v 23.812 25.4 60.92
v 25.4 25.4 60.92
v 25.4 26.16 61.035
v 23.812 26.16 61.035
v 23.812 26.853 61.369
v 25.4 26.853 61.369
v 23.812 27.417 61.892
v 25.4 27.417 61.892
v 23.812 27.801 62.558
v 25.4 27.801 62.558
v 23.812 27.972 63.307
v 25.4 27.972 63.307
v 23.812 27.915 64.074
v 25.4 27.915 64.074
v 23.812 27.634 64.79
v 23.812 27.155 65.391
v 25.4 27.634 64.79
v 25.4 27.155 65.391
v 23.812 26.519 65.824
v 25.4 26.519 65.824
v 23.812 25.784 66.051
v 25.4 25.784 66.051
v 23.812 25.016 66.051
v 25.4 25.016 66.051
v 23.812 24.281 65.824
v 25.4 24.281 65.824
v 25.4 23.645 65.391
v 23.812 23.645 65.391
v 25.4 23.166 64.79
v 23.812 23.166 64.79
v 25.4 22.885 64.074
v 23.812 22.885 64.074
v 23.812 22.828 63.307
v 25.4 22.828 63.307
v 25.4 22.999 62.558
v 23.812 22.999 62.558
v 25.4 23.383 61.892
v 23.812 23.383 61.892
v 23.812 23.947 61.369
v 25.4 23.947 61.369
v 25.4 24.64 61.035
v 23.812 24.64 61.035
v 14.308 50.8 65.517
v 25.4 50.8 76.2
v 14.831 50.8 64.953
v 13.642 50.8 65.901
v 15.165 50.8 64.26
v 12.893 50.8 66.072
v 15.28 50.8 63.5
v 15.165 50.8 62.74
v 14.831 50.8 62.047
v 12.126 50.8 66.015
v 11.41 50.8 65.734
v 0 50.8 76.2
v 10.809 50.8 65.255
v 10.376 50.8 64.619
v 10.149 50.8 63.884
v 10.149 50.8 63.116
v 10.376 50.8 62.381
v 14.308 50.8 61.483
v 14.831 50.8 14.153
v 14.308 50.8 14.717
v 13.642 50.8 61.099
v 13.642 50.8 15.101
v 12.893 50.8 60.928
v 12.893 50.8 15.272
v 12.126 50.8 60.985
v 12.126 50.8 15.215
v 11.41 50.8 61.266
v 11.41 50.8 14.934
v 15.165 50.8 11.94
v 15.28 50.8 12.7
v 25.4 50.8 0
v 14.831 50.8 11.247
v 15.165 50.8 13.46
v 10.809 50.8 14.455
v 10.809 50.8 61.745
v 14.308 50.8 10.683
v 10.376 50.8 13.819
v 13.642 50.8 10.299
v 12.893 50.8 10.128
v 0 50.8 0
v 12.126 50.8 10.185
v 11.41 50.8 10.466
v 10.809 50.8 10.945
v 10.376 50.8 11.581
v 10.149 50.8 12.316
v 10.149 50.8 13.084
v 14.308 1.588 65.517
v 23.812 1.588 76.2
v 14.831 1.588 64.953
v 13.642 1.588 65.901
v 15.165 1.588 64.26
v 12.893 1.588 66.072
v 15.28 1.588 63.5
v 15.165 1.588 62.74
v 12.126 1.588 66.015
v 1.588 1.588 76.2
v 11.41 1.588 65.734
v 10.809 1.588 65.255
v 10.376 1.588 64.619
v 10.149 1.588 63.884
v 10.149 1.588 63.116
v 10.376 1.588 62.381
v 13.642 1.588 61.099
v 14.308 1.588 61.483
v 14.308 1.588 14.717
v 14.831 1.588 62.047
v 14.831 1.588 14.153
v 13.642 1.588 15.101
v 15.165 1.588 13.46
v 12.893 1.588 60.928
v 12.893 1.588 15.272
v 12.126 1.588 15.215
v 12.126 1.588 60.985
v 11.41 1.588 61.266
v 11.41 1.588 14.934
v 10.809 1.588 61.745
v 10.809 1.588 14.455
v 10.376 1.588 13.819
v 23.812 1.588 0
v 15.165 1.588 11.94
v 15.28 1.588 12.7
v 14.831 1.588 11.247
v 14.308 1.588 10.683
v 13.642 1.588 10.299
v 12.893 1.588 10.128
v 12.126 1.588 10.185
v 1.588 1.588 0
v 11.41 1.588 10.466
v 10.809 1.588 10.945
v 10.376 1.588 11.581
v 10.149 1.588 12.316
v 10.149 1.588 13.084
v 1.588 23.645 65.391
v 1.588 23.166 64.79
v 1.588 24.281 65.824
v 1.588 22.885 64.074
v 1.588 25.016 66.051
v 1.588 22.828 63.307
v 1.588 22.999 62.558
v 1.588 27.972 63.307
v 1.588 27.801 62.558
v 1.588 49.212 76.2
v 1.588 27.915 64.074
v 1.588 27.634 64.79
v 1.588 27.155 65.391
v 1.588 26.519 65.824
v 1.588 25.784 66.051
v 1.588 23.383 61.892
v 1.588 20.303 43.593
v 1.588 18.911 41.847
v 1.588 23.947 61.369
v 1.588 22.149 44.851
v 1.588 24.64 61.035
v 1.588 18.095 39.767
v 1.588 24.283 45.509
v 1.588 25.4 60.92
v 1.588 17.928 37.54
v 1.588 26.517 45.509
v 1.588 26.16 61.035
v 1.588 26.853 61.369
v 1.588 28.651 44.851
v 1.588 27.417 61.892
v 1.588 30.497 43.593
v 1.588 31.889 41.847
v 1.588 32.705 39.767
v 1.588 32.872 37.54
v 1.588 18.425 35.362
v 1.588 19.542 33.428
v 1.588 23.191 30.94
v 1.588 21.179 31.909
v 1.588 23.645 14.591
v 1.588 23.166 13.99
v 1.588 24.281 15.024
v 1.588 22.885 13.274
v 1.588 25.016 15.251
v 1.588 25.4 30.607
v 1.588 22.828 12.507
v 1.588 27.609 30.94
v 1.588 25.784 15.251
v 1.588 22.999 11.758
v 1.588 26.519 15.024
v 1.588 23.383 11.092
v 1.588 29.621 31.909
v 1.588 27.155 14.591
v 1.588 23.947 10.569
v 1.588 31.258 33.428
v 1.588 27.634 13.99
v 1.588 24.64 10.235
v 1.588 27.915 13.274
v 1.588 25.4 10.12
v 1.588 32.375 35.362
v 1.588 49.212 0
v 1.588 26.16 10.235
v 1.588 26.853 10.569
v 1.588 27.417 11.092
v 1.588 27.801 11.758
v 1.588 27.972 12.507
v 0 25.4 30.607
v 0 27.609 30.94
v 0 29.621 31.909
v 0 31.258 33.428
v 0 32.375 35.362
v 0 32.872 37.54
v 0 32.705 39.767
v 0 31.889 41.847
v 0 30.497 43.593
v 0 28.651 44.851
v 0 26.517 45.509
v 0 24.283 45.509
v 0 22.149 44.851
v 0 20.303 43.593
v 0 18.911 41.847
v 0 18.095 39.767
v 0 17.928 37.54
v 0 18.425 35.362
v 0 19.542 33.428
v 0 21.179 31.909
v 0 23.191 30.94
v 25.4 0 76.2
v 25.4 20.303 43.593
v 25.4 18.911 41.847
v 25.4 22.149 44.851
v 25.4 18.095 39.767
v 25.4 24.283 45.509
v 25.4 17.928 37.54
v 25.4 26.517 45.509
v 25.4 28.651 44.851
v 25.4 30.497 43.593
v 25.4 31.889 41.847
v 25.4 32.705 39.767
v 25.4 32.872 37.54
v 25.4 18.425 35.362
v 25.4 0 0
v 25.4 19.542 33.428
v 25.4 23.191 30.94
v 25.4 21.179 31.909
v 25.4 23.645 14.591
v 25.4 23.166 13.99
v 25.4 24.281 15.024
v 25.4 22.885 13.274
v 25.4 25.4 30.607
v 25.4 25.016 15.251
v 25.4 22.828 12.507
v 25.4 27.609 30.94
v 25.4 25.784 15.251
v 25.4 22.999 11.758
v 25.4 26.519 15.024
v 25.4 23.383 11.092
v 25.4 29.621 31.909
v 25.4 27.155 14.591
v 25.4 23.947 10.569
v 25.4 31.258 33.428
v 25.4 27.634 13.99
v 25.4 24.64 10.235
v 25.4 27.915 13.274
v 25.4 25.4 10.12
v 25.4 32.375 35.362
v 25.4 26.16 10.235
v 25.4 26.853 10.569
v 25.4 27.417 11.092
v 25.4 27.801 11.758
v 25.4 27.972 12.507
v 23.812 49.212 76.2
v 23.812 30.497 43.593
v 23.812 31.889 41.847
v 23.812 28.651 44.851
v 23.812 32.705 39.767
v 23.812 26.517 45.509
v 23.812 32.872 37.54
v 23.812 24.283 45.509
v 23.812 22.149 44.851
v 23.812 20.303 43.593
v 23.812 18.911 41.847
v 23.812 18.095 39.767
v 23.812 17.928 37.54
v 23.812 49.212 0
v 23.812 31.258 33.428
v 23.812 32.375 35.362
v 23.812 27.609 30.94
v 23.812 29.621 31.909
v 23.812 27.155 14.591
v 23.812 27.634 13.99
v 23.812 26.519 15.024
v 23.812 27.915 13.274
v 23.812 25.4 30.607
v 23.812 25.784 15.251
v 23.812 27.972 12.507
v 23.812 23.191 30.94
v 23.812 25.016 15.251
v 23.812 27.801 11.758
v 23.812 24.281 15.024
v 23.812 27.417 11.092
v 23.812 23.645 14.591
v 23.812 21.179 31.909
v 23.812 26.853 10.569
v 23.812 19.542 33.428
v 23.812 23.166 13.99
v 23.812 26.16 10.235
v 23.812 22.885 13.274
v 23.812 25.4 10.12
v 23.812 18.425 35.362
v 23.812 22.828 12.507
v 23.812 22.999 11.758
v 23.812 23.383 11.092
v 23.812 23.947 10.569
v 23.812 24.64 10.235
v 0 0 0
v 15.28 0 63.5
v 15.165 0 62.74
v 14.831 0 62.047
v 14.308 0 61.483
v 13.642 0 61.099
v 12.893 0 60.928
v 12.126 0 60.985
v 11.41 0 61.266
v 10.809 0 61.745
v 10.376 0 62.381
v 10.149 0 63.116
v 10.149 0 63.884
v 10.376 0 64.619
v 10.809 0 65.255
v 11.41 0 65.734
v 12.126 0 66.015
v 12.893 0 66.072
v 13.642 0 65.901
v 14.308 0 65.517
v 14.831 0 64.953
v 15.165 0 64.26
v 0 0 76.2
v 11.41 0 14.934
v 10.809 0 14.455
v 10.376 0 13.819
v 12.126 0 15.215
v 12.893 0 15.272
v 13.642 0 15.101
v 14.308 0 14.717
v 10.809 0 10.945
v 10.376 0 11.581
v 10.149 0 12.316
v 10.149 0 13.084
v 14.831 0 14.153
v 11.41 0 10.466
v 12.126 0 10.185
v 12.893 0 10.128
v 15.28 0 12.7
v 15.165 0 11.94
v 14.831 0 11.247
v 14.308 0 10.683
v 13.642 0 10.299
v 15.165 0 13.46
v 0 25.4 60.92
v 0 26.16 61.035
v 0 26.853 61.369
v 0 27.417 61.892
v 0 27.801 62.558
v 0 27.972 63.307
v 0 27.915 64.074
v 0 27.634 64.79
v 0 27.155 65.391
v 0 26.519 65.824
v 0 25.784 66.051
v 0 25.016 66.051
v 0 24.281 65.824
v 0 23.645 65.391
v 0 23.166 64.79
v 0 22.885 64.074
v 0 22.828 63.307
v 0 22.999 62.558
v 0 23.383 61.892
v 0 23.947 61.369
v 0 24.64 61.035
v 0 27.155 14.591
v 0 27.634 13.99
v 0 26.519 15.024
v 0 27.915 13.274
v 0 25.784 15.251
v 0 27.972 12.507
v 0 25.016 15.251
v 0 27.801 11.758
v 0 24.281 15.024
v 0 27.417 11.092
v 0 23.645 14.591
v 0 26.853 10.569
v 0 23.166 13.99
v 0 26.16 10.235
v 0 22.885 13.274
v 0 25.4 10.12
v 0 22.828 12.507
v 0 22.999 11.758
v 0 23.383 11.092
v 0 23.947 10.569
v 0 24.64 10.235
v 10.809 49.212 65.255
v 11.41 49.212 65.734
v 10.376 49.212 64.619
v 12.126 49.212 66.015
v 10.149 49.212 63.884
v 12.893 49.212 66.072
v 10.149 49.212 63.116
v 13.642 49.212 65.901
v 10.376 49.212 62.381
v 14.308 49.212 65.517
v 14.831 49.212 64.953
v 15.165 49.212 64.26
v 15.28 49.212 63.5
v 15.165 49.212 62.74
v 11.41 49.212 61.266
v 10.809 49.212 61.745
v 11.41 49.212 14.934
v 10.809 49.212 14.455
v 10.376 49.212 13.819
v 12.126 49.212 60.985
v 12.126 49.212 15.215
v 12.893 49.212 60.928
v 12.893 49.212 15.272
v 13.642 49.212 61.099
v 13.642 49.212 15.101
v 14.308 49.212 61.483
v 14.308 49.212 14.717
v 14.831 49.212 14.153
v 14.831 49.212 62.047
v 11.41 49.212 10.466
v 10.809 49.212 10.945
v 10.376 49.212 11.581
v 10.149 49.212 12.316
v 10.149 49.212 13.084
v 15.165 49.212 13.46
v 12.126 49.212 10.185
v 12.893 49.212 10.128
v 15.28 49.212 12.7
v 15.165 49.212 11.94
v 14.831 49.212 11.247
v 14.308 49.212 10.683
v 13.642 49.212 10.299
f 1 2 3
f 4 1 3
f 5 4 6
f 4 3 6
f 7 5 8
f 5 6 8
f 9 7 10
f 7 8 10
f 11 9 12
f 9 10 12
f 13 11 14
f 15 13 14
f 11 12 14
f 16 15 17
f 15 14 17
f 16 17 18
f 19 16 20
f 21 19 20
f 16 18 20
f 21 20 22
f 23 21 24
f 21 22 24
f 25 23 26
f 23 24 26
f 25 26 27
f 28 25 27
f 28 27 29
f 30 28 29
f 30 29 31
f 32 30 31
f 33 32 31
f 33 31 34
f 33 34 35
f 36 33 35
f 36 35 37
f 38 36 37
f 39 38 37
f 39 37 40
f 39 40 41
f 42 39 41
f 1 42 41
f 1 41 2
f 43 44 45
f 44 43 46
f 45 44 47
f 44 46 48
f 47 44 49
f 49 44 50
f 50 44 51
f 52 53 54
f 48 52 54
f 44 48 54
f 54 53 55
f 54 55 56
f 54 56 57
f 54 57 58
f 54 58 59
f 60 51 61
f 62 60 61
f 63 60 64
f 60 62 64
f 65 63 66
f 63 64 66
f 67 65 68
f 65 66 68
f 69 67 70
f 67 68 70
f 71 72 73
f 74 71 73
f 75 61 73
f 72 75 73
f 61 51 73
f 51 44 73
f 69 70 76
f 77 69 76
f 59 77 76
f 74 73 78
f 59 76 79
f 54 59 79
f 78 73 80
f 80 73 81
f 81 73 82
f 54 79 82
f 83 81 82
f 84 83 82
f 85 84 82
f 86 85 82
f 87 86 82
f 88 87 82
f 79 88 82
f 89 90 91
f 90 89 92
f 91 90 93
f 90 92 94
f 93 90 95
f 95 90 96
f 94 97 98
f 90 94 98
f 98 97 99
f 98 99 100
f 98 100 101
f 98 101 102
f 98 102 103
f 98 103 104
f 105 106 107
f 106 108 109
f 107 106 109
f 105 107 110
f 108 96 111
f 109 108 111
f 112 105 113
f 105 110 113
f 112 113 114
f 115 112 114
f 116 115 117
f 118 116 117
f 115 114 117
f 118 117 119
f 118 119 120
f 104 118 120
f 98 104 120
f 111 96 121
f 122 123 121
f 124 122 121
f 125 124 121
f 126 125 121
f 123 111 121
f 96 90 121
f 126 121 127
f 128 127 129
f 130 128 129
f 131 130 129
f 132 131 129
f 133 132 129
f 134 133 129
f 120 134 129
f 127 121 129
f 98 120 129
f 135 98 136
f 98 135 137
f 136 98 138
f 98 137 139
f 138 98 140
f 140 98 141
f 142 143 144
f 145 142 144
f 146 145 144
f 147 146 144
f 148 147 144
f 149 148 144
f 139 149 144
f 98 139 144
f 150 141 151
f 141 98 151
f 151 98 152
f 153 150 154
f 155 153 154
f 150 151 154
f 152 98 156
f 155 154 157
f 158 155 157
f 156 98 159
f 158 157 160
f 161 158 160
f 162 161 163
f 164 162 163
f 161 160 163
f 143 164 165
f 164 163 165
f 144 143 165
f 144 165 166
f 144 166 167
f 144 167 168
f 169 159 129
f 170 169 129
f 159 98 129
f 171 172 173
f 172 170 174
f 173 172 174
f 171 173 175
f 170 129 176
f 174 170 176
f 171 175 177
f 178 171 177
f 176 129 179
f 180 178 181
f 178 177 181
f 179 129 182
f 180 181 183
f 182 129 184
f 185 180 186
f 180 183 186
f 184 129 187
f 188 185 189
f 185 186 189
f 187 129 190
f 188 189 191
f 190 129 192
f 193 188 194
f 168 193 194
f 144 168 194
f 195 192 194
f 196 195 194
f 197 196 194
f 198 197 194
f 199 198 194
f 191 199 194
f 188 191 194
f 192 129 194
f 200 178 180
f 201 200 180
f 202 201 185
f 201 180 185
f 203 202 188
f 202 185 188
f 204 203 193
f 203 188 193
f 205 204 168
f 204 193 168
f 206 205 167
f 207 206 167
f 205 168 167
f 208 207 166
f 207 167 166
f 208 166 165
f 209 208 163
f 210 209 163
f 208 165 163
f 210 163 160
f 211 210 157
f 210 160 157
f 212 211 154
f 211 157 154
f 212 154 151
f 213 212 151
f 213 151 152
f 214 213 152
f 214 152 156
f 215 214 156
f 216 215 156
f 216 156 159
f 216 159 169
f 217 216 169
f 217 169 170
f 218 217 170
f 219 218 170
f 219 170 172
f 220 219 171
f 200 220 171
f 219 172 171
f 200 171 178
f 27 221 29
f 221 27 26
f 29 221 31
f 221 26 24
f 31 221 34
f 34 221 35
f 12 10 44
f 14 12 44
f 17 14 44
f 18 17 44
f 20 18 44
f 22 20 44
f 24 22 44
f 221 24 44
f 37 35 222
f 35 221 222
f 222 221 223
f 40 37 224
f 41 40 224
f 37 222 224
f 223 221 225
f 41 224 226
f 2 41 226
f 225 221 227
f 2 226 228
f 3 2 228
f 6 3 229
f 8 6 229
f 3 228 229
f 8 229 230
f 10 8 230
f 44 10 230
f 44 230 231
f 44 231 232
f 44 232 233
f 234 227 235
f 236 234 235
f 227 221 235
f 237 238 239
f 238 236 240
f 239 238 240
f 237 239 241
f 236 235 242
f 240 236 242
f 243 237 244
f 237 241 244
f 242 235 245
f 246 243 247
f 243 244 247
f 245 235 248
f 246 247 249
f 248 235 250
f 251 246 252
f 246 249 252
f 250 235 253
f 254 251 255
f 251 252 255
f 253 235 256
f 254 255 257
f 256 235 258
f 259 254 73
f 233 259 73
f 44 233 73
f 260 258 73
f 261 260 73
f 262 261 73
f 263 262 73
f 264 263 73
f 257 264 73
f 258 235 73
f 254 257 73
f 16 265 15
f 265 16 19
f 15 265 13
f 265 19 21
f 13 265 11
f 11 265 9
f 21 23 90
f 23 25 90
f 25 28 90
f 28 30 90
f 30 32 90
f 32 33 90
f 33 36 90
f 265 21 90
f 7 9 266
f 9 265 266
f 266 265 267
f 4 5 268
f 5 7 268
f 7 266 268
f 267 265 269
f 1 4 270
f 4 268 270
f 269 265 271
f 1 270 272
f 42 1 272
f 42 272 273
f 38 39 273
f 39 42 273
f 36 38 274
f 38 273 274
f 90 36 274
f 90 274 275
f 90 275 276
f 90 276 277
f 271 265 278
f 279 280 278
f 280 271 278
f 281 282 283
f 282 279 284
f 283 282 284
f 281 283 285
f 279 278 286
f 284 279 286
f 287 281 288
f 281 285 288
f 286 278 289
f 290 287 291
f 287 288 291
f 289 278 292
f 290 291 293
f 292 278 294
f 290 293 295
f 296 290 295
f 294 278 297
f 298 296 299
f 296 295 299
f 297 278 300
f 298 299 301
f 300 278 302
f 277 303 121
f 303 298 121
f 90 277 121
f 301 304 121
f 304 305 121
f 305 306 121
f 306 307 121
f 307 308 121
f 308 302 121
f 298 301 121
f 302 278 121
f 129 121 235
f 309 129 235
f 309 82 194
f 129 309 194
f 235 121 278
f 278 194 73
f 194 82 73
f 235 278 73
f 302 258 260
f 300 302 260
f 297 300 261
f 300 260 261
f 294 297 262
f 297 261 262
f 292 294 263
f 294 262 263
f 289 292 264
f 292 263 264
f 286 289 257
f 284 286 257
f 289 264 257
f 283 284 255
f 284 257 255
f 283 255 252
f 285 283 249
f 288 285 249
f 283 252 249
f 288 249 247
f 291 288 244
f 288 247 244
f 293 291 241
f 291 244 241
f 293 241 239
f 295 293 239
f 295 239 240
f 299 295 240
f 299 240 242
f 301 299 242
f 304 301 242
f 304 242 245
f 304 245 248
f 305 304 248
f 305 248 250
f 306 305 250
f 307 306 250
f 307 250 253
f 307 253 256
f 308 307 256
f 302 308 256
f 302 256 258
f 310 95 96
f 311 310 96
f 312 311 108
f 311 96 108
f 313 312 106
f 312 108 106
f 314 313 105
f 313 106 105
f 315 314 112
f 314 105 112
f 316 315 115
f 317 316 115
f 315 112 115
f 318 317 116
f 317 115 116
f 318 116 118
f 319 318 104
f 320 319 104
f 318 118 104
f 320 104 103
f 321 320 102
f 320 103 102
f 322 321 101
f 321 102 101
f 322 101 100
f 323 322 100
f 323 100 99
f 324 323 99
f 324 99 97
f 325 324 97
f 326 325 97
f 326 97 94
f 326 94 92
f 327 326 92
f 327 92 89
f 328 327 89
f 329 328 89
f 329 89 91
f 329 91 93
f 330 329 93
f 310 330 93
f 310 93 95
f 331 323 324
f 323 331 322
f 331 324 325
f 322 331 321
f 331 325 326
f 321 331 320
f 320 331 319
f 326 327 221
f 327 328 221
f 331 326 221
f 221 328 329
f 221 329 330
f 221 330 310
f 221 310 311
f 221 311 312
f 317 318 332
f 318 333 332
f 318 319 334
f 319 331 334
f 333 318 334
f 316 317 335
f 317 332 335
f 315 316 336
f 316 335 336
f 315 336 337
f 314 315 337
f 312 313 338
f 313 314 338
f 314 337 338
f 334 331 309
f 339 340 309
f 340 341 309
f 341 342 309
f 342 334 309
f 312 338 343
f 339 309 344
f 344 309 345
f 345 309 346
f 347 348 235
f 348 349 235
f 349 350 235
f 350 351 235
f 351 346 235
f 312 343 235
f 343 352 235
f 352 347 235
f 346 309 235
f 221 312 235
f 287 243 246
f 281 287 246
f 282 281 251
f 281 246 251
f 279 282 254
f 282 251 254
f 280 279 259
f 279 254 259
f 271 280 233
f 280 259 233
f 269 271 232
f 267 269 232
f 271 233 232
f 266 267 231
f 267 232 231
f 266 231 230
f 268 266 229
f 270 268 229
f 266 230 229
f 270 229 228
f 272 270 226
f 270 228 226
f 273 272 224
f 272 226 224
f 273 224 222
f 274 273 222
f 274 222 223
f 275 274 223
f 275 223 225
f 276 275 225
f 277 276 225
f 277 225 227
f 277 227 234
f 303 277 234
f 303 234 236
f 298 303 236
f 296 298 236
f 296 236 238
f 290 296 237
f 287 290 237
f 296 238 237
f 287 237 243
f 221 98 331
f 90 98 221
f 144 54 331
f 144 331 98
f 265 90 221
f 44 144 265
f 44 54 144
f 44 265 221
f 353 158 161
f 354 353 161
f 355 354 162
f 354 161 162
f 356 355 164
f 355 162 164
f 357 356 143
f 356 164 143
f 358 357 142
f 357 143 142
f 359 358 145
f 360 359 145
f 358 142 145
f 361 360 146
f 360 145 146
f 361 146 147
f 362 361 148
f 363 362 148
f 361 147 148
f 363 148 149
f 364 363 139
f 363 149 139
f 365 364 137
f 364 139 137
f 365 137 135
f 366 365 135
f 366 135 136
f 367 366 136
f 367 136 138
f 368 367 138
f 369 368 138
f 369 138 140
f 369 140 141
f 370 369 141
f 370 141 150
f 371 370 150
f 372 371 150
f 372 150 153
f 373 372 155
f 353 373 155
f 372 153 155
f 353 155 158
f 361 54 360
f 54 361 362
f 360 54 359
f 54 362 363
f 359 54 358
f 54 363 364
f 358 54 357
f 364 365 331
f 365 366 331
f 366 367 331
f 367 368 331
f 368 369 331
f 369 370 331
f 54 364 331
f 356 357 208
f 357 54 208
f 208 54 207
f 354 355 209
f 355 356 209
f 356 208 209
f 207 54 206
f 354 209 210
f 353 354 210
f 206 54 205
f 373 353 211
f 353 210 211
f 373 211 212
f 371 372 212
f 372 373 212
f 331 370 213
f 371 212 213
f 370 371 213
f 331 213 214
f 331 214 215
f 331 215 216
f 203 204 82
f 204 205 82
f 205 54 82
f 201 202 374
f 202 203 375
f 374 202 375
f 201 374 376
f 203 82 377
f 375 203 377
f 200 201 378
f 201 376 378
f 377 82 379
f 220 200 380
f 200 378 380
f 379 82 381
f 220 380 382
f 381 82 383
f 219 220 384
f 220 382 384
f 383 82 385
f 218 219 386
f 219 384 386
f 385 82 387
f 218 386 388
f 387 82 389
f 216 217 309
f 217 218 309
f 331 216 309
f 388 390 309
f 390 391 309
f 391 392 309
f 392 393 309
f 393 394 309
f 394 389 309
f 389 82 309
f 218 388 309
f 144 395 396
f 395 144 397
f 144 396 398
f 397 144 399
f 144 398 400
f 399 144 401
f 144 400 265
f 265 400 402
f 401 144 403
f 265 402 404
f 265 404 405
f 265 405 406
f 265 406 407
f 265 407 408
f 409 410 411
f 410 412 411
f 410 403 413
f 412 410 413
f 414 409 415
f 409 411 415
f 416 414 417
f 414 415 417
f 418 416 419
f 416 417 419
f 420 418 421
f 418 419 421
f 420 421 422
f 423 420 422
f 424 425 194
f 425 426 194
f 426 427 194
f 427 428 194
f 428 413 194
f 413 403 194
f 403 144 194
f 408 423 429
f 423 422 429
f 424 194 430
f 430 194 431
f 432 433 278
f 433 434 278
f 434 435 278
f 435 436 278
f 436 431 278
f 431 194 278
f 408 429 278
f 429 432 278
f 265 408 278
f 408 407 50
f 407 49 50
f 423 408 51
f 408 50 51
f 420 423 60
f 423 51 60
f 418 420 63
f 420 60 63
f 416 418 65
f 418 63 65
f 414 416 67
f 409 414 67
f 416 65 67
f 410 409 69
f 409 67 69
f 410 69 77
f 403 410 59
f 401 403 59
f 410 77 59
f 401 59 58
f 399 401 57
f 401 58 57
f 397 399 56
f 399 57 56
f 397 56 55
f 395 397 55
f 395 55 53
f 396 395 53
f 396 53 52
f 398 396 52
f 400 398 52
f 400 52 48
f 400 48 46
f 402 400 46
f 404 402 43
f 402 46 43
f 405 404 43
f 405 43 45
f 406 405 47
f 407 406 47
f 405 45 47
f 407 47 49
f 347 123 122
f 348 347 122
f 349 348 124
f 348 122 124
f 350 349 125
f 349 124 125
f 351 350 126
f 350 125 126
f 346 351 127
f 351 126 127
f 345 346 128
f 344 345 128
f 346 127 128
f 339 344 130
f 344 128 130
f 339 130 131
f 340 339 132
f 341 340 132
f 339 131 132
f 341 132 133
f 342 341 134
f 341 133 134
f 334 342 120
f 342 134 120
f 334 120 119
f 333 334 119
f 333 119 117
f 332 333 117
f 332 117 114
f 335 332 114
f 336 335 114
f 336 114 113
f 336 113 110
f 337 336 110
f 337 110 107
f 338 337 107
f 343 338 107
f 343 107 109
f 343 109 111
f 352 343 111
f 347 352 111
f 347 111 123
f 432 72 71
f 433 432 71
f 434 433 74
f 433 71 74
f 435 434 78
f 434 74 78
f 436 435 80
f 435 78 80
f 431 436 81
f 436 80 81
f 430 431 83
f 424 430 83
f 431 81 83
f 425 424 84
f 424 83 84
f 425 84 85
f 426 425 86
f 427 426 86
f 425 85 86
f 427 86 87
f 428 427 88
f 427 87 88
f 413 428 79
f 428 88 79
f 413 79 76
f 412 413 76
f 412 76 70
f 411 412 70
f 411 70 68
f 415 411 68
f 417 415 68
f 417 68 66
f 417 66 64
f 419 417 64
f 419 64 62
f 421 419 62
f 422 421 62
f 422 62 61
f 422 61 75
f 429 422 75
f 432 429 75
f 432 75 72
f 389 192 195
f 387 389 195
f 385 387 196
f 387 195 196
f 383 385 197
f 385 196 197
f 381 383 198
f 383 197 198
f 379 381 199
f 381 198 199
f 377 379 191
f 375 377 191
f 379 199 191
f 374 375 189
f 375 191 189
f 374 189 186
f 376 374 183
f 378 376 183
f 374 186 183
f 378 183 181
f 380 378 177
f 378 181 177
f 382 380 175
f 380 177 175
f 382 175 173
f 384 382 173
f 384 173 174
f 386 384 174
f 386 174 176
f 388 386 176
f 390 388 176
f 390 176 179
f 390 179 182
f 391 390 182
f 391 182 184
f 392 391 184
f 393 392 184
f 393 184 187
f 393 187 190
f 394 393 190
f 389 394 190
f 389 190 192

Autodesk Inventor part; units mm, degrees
ref_plane "YZ Plane" through (0, 0, 0) normal (1, 0, 0) x (0, 1, 0)
ref_plane "XZ Plane" through (0, 0, 0) normal (0, 1, 0) x (-1, 0, 0)
ref_plane "XY Plane" through (0, 0, 0) normal (0, 0, 1) x (1, 0, 0)
sketch "Sketch1" plane through (0, 0, 0) normal (0, 0, 1) x (1, 0, 0)
  line L0 (0, 0) -> (25.4, 0)
  line L1 (25.4, 0) -> (25.4, 50.8)
  line L2 (25.4, 50.8) -> (0, 50.8)
  line L3 (0, 50.8) -> (0, 0)
  line L4 (1.5875, 49.2125) -> (23.8125, 49.2125)
  line L5 (23.8125, 49.2125) -> (23.8125, 1.5875)
  line L6 (23.8125, 1.5875) -> (1.5875, 1.5875)
  line L7 (1.5875, 1.5875) -> (1.5875, 49.2125)
  dimension "d0" = 25.4
  dimension "d1" = 50.8
  dimension "d2" = 1.5875
extrude "Extrusion1" add sketch "Sketch1" along normal blind 76.2
sketch "Sketch3" plane through (25.4, 0, 0) normal (1, 0, 0) x (0, 0, -1)
  line L0 (0, 50.8) -> (-76.2, 50.8) construction
  line L1 (-38.1, 50.8) -> (-38.1, 25.4) construction
  circle A0 centre (-38.1, 25.4) radius 7.493
  point P0 (0, 0)
  dimension "d10" = 25.4
  dimension "d15" = 14.986
extrude "Extrusion3" cut sketch "Sketch3" against normal blind 82.55
sketch "Sketch4" plane through (0, 50.8, 0) normal (0, 1, 0) x (1, 0, 0)
  line L0 (1.5875, 0) -> (23.8125, 0) construction
  line L1 (12.7, 0) -> (12.7, -12.7) construction
  line L2 (23.8125, -76.2) -> (1.5875, -76.2) construction
  line L3 (12.7, -76.2) -> (12.7, -63.5) construction
  circle A0 centre (12.7, -63.5) radius 2.5797
  circle A1 centre (12.7, -12.7) radius 2.5797
  point P0 (0, 0)
  dimension "d16" = 12.7
  dimension "d17" = 12.7
  dimension "d18" = 5.1594
extrude "Extrusion4" cut sketch "Sketch4" against normal blind 82.55
sketch "Sketch5" plane through (25.4, 0, 0) normal (1, 0, 0) x (0, 0, -1)
  line L0 (0, 0) -> (0, 50.8) projected
  line L1 (0, 25.4) -> (-12.7, 25.4) construction
  line L2 (-76.2, 49.2125) -> (-76.2, 1.5875) projected
  line L3 (-76.2, 25.4) -> (-63.5, 25.4) construction
  circle A0 centre (-63.5, 25.4) radius 2.5797
  circle A1 centre (-12.7, 25.4) radius 2.5797
  dimension "d21" = 12.7
  dimension "d22" = 12.7
  dimension "d23" = 5.1594
extrude "Extrusion5" cut sketch "Sketch5" against normal blind 25.4
properties part number "1x1 Bumper Attachment"
